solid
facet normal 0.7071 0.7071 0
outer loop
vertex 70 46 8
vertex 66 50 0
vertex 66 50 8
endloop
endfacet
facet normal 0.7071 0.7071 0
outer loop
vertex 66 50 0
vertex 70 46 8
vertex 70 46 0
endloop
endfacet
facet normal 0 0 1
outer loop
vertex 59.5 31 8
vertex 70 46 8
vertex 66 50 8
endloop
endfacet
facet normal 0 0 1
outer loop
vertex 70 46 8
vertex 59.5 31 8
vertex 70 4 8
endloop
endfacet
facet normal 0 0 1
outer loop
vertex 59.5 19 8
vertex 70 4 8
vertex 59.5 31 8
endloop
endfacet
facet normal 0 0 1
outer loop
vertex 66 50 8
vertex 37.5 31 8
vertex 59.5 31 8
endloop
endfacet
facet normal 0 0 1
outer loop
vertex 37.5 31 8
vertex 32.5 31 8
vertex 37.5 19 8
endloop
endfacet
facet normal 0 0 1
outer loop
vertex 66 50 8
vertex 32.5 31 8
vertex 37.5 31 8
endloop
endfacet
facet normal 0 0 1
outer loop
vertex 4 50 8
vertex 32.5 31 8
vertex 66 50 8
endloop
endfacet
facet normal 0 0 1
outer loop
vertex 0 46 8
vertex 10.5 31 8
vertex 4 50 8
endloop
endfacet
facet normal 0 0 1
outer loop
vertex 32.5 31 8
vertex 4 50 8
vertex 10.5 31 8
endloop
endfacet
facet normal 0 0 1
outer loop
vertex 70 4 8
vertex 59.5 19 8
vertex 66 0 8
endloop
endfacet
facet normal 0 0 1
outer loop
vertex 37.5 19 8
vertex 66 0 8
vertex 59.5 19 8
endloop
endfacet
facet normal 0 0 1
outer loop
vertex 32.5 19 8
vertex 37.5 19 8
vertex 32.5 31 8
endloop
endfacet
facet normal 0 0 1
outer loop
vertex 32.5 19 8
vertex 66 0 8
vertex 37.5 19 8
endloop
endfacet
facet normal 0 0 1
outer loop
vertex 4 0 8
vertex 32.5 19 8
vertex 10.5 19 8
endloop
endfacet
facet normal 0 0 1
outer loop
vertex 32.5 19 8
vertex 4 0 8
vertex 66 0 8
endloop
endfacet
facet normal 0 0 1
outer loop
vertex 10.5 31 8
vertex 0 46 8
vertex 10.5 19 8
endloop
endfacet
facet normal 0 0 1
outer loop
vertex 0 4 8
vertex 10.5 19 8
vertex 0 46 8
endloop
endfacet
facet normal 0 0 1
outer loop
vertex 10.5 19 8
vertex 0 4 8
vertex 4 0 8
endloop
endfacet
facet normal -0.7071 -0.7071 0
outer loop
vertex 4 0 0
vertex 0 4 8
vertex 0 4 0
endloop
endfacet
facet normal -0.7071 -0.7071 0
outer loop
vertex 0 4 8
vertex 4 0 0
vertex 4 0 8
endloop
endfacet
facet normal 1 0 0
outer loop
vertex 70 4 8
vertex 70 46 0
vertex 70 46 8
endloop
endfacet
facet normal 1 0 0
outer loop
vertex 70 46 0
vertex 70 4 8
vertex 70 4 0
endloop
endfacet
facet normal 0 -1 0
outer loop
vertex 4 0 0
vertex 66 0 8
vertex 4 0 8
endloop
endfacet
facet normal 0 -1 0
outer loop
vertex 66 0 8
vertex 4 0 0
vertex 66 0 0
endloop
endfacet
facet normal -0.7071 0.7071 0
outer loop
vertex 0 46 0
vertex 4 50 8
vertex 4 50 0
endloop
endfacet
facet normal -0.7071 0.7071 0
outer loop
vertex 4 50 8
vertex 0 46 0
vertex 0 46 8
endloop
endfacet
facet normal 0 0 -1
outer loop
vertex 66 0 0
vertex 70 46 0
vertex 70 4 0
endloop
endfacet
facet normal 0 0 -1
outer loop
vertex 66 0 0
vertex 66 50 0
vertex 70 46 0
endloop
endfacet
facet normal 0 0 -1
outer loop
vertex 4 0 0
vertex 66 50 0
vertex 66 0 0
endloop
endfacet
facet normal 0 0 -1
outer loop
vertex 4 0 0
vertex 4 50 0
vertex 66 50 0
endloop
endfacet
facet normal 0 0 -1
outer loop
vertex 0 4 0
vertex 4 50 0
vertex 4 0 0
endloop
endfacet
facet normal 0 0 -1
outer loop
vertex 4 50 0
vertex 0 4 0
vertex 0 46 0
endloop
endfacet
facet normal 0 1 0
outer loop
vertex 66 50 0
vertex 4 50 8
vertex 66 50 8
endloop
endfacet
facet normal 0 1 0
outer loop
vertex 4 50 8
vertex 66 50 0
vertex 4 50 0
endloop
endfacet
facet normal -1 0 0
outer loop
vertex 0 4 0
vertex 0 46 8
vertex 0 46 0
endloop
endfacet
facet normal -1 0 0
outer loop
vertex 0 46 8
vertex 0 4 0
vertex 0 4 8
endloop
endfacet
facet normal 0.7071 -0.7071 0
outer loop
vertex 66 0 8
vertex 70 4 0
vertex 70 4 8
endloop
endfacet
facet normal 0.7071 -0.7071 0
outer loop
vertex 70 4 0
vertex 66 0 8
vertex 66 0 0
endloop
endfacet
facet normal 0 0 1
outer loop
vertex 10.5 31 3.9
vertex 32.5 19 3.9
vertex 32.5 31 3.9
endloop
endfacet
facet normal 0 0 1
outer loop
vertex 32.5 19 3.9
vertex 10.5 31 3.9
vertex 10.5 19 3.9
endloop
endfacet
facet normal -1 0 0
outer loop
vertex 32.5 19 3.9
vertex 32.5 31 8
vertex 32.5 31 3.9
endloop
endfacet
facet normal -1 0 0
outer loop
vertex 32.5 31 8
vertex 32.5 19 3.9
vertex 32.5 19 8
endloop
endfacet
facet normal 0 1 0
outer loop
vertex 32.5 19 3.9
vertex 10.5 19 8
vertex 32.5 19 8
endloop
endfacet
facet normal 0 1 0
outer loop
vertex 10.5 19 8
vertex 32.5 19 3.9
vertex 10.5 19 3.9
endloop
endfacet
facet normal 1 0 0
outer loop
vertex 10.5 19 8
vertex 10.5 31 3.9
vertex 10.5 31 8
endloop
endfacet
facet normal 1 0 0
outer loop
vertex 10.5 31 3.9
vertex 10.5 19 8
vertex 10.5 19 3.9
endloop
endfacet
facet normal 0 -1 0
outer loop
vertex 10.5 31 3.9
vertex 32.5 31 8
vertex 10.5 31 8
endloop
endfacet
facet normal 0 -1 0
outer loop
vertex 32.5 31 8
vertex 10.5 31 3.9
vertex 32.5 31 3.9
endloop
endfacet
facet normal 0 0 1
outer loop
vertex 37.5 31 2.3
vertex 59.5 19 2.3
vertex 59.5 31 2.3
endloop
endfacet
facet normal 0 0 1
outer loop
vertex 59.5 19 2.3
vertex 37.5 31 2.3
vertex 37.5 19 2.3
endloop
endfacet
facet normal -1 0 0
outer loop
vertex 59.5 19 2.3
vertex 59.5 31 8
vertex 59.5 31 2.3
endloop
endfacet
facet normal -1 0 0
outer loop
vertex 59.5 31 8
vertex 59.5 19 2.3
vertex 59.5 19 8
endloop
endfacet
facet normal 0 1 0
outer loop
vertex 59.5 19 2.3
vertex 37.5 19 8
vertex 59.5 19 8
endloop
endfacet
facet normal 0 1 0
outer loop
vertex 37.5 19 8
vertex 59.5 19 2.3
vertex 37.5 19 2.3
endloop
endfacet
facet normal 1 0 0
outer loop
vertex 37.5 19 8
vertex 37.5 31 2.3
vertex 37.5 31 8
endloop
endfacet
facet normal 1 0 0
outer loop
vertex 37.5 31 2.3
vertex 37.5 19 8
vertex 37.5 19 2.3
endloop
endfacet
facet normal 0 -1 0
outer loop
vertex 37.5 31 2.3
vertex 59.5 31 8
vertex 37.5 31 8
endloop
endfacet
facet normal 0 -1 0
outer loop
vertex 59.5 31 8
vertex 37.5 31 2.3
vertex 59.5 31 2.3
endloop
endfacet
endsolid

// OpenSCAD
$fn = 32;

// ----------------------------------------------------------------------
// Windowed plate: 2 voids, 70 x 50 x 8 mm
// ----------------------------------------------------------------------

// --- parameters (mm) ---
plate_l = 70;             // plate length, X
plate_w = 50;             // plate width, Y
plate_t = 8;              // plate thickness, Z
edge_margin = 8;          // wall from the plate edge to any window
windows = 2;              // number of windows in the row
win_l = 22;               // window length
win_w = 12;               // window width
win_pitch = 27;           // window pitch along X
depth_1 = 4.1;            // depth of void 1 (full thickness = through)
depth_2 = 5.7;            // depth of void 2 (full thickness = through)
corner_c = 4;             // corner chamfer of the plate

profile = [[4, 0], [66, 0], [70, 4], [70, 46], [66, 50], [4, 50], [0, 46], [0, 4]];  // primary outline, 8 points, counter clockwise
void_1 = [[10.5, 19], [32.5, 19], [32.5, 31], [10.5, 31]];  // window 1 of the row, 4 points
void_2 = [[37.5, 19], [59.5, 19], [59.5, 31], [37.5, 31]];  // window 2 of the row, 4 points

// --- the one profile operation ---
difference() {
  linear_extrude(height = plate_t) polygon(points = profile);
  translate([0, 0, plate_t - depth_1])
    linear_extrude(height = depth_1 + 1) polygon(points = void_1);
  translate([0, 0, plate_t - depth_2])
    linear_extrude(height = depth_2 + 1) polygon(points = void_2);
}
